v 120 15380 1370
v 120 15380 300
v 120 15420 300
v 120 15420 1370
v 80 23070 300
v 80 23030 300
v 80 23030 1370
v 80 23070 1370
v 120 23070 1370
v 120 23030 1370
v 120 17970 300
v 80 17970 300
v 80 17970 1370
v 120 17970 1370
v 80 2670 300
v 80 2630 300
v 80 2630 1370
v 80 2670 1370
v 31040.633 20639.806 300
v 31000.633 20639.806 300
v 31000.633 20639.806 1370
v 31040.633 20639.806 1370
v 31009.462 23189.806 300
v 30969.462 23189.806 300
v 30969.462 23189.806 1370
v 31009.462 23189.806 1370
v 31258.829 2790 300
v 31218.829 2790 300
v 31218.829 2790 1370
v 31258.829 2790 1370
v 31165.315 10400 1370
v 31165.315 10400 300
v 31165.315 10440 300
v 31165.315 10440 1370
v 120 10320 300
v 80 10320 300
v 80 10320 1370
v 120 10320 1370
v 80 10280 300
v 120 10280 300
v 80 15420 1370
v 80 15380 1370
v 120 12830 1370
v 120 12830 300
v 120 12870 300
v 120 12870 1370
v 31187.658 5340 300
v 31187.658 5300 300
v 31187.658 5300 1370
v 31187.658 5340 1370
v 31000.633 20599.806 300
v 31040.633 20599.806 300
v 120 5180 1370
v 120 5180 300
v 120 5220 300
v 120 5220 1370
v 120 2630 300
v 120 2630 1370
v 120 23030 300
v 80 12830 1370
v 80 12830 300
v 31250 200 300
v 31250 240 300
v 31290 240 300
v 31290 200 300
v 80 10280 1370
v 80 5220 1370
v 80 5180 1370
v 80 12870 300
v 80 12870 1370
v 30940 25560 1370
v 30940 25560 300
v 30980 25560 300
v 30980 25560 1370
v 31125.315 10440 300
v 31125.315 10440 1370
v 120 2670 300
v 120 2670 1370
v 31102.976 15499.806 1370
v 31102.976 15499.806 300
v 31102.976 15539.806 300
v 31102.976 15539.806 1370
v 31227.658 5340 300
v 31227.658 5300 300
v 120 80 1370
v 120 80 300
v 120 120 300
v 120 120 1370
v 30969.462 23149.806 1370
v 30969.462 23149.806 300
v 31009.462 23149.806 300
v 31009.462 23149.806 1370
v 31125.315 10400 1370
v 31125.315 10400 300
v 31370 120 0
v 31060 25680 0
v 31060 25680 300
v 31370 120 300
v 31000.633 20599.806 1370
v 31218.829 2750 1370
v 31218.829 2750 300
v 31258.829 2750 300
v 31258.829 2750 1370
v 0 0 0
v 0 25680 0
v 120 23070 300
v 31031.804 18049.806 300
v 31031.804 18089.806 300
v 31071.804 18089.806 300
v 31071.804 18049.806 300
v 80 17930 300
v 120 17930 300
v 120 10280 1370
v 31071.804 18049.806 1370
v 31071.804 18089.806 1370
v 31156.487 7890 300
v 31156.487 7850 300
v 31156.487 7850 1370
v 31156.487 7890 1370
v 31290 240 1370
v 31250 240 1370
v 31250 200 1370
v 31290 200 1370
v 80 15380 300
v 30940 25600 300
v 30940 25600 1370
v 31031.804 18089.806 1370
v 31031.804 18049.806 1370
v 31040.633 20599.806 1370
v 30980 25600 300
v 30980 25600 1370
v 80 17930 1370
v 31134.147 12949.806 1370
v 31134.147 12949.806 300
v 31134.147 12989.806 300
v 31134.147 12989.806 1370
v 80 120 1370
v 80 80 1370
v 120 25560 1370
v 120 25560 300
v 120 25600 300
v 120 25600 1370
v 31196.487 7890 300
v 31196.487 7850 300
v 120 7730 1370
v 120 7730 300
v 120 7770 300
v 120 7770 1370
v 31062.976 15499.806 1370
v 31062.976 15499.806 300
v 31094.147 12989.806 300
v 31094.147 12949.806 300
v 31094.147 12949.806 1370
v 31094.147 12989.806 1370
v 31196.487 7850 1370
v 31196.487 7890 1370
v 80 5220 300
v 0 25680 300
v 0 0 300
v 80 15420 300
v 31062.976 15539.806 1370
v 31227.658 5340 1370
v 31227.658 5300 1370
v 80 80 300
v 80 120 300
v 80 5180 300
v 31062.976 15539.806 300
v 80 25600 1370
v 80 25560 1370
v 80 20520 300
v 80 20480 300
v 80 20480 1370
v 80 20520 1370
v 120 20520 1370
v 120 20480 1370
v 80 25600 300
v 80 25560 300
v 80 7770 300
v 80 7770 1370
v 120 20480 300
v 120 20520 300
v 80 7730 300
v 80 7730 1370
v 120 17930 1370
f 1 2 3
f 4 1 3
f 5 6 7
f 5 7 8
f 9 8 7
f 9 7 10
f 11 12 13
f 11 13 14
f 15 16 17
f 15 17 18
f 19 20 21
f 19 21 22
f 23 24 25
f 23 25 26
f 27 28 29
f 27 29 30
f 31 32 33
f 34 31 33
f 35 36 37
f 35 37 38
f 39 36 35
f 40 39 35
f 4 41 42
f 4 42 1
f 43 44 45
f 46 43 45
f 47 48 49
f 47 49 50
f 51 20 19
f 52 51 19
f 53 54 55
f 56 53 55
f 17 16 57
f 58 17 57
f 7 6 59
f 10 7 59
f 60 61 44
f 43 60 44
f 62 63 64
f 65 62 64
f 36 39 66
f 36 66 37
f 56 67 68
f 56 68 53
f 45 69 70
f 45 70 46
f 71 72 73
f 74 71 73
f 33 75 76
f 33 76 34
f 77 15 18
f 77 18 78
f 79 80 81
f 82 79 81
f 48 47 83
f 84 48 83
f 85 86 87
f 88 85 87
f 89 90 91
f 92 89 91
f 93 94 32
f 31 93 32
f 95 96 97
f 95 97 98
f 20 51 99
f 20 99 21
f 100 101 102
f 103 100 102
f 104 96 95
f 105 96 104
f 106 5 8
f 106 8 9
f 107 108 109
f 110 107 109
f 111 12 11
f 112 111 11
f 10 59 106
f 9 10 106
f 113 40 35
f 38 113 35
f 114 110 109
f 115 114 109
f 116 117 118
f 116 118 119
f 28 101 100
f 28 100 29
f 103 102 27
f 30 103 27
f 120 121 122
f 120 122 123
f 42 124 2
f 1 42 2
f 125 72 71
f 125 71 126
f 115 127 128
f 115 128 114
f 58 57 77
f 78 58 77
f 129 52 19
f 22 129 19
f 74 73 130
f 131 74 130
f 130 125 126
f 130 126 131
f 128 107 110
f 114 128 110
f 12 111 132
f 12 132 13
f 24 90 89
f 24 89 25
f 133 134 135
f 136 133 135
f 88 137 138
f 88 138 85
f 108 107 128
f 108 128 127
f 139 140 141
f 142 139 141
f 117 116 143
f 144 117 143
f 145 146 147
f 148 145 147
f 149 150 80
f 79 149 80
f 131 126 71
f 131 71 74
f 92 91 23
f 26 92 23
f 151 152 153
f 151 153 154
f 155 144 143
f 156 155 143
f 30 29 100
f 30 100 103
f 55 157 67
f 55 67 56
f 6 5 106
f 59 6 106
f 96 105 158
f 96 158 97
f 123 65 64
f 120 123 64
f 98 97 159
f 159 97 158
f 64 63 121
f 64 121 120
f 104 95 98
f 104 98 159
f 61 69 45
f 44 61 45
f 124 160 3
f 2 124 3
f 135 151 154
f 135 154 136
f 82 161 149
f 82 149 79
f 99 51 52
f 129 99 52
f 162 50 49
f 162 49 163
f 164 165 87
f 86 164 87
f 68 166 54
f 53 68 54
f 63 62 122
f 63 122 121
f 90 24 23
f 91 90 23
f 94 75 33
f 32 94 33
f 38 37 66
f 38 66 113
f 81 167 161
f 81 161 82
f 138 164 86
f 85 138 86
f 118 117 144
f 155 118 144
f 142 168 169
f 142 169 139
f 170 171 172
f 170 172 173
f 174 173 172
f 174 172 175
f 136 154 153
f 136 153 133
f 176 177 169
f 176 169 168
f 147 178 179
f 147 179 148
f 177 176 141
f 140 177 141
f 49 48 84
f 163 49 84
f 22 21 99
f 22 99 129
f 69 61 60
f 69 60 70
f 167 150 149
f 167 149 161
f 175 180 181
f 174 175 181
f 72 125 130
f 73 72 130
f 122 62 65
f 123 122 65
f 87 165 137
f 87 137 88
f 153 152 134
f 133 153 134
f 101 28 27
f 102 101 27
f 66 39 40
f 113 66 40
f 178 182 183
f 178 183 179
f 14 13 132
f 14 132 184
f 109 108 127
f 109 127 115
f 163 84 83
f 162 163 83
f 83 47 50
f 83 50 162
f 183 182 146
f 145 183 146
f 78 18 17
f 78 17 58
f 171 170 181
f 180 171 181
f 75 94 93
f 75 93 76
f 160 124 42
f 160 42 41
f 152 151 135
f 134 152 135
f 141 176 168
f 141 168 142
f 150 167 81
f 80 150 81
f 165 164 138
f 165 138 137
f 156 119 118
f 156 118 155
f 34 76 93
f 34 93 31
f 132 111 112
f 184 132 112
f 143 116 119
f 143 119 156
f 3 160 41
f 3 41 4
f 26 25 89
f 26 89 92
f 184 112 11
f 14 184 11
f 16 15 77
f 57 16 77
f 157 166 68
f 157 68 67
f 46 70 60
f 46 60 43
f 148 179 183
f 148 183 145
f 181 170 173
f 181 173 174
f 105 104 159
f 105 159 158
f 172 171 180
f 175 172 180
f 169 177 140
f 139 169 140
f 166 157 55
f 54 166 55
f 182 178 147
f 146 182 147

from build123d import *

# Parameters (mm, degrees)
EXTRUDE_DEPTH    = 300
SKETCH001_W      = 40
SKETCH001_H      = 40
EXTRUDE001_DEPTH = 1070


with BuildPart() as extrude_body:
    # Sketch → Extrude (new body)
    with BuildSketch(Plane.XY):
        Polygon((0, 0), (0, 25680), (31060, 25680), (31370, 120), align=None)
    extrude(amount=EXTRUDE_DEPTH)


with BuildPart() as extrude001:
    # Sketch001 → Extrude001 (new body)
    with BuildSketch(Plane(origin=(15595.505376, 12848.724342, 300), x_dir=(1, 0, 0), z_dir=(0, 0, 1))):
        with Locations((-15495.505376, -12748.724342)):
            Rectangle(SKETCH001_W, SKETCH001_H)
        with Locations((15674.494624, -12628.724342)):
            Rectangle(SKETCH001_W, SKETCH001_H)
        with Locations((15364.494624, 12731.275658)):
            Rectangle(SKETCH001_W, SKETCH001_H)
        with Locations((-15495.505376, 12731.275658)):
            Rectangle(SKETCH001_W, SKETCH001_H)
        with Locations((-15495.505376, -10198.724342)):
            Rectangle(SKETCH001_W, SKETCH001_H)
        with Locations((-15495.505376, -7648.724342)):
            Rectangle(SKETCH001_W, SKETCH001_H)
        with Locations((-15495.505376, -5098.724342)):
            Rectangle(SKETCH001_W, SKETCH001_H)
        with Locations((-15495.505376, -2548.724342)):
            Rectangle(SKETCH001_W, SKETCH001_H)
        with Locations((-15495.505376, 1.275658)):
            Rectangle(SKETCH001_W, SKETCH001_H)
        with Locations((-15495.505376, 2551.275658)):
            Rectangle(SKETCH001_W, SKETCH001_H)
        with Locations((-15495.505376, 5101.275658)):
            Rectangle(SKETCH001_W, SKETCH001_H)
        with Locations((-15495.505376, 7651.275658)):
            Rectangle(SKETCH001_W, SKETCH001_H)
        with Locations((-15495.505376, 10201.275658)):
            Rectangle(SKETCH001_W, SKETCH001_H)
        with Locations((15643.323489, -10078.724342)):
            Rectangle(SKETCH001_W, SKETCH001_H)
        with Locations((15612.152353, -7528.724342)):
            Rectangle(SKETCH001_W, SKETCH001_H)
        with Locations((15580.981217, -4978.724342)):
            Rectangle(SKETCH001_W, SKETCH001_H)
        with Locations((15549.810082, -2428.724342)):
            Rectangle(SKETCH001_W, SKETCH001_H)
        with Locations((15518.641312, 121.082127)):
            Rectangle(SKETCH001_W, SKETCH001_H)
        with Locations((15487.470176, 2671.082127)):
            Rectangle(SKETCH001_W, SKETCH001_H)
        with Locations((15456.29904, 5221.082127)):
            Rectangle(SKETCH001_W, SKETCH001_H)
        with Locations((15425.127905, 7771.082127)):
            Rectangle(SKETCH001_W, SKETCH001_H)
        with Locations((15393.956769, 10321.082127)):
            Rectangle(SKETCH001_W, SKETCH001_H)
    extrude(amount=EXTRUDE001_DEPTH)


solid = Compound([extrude_body.part, extrude001.part])
